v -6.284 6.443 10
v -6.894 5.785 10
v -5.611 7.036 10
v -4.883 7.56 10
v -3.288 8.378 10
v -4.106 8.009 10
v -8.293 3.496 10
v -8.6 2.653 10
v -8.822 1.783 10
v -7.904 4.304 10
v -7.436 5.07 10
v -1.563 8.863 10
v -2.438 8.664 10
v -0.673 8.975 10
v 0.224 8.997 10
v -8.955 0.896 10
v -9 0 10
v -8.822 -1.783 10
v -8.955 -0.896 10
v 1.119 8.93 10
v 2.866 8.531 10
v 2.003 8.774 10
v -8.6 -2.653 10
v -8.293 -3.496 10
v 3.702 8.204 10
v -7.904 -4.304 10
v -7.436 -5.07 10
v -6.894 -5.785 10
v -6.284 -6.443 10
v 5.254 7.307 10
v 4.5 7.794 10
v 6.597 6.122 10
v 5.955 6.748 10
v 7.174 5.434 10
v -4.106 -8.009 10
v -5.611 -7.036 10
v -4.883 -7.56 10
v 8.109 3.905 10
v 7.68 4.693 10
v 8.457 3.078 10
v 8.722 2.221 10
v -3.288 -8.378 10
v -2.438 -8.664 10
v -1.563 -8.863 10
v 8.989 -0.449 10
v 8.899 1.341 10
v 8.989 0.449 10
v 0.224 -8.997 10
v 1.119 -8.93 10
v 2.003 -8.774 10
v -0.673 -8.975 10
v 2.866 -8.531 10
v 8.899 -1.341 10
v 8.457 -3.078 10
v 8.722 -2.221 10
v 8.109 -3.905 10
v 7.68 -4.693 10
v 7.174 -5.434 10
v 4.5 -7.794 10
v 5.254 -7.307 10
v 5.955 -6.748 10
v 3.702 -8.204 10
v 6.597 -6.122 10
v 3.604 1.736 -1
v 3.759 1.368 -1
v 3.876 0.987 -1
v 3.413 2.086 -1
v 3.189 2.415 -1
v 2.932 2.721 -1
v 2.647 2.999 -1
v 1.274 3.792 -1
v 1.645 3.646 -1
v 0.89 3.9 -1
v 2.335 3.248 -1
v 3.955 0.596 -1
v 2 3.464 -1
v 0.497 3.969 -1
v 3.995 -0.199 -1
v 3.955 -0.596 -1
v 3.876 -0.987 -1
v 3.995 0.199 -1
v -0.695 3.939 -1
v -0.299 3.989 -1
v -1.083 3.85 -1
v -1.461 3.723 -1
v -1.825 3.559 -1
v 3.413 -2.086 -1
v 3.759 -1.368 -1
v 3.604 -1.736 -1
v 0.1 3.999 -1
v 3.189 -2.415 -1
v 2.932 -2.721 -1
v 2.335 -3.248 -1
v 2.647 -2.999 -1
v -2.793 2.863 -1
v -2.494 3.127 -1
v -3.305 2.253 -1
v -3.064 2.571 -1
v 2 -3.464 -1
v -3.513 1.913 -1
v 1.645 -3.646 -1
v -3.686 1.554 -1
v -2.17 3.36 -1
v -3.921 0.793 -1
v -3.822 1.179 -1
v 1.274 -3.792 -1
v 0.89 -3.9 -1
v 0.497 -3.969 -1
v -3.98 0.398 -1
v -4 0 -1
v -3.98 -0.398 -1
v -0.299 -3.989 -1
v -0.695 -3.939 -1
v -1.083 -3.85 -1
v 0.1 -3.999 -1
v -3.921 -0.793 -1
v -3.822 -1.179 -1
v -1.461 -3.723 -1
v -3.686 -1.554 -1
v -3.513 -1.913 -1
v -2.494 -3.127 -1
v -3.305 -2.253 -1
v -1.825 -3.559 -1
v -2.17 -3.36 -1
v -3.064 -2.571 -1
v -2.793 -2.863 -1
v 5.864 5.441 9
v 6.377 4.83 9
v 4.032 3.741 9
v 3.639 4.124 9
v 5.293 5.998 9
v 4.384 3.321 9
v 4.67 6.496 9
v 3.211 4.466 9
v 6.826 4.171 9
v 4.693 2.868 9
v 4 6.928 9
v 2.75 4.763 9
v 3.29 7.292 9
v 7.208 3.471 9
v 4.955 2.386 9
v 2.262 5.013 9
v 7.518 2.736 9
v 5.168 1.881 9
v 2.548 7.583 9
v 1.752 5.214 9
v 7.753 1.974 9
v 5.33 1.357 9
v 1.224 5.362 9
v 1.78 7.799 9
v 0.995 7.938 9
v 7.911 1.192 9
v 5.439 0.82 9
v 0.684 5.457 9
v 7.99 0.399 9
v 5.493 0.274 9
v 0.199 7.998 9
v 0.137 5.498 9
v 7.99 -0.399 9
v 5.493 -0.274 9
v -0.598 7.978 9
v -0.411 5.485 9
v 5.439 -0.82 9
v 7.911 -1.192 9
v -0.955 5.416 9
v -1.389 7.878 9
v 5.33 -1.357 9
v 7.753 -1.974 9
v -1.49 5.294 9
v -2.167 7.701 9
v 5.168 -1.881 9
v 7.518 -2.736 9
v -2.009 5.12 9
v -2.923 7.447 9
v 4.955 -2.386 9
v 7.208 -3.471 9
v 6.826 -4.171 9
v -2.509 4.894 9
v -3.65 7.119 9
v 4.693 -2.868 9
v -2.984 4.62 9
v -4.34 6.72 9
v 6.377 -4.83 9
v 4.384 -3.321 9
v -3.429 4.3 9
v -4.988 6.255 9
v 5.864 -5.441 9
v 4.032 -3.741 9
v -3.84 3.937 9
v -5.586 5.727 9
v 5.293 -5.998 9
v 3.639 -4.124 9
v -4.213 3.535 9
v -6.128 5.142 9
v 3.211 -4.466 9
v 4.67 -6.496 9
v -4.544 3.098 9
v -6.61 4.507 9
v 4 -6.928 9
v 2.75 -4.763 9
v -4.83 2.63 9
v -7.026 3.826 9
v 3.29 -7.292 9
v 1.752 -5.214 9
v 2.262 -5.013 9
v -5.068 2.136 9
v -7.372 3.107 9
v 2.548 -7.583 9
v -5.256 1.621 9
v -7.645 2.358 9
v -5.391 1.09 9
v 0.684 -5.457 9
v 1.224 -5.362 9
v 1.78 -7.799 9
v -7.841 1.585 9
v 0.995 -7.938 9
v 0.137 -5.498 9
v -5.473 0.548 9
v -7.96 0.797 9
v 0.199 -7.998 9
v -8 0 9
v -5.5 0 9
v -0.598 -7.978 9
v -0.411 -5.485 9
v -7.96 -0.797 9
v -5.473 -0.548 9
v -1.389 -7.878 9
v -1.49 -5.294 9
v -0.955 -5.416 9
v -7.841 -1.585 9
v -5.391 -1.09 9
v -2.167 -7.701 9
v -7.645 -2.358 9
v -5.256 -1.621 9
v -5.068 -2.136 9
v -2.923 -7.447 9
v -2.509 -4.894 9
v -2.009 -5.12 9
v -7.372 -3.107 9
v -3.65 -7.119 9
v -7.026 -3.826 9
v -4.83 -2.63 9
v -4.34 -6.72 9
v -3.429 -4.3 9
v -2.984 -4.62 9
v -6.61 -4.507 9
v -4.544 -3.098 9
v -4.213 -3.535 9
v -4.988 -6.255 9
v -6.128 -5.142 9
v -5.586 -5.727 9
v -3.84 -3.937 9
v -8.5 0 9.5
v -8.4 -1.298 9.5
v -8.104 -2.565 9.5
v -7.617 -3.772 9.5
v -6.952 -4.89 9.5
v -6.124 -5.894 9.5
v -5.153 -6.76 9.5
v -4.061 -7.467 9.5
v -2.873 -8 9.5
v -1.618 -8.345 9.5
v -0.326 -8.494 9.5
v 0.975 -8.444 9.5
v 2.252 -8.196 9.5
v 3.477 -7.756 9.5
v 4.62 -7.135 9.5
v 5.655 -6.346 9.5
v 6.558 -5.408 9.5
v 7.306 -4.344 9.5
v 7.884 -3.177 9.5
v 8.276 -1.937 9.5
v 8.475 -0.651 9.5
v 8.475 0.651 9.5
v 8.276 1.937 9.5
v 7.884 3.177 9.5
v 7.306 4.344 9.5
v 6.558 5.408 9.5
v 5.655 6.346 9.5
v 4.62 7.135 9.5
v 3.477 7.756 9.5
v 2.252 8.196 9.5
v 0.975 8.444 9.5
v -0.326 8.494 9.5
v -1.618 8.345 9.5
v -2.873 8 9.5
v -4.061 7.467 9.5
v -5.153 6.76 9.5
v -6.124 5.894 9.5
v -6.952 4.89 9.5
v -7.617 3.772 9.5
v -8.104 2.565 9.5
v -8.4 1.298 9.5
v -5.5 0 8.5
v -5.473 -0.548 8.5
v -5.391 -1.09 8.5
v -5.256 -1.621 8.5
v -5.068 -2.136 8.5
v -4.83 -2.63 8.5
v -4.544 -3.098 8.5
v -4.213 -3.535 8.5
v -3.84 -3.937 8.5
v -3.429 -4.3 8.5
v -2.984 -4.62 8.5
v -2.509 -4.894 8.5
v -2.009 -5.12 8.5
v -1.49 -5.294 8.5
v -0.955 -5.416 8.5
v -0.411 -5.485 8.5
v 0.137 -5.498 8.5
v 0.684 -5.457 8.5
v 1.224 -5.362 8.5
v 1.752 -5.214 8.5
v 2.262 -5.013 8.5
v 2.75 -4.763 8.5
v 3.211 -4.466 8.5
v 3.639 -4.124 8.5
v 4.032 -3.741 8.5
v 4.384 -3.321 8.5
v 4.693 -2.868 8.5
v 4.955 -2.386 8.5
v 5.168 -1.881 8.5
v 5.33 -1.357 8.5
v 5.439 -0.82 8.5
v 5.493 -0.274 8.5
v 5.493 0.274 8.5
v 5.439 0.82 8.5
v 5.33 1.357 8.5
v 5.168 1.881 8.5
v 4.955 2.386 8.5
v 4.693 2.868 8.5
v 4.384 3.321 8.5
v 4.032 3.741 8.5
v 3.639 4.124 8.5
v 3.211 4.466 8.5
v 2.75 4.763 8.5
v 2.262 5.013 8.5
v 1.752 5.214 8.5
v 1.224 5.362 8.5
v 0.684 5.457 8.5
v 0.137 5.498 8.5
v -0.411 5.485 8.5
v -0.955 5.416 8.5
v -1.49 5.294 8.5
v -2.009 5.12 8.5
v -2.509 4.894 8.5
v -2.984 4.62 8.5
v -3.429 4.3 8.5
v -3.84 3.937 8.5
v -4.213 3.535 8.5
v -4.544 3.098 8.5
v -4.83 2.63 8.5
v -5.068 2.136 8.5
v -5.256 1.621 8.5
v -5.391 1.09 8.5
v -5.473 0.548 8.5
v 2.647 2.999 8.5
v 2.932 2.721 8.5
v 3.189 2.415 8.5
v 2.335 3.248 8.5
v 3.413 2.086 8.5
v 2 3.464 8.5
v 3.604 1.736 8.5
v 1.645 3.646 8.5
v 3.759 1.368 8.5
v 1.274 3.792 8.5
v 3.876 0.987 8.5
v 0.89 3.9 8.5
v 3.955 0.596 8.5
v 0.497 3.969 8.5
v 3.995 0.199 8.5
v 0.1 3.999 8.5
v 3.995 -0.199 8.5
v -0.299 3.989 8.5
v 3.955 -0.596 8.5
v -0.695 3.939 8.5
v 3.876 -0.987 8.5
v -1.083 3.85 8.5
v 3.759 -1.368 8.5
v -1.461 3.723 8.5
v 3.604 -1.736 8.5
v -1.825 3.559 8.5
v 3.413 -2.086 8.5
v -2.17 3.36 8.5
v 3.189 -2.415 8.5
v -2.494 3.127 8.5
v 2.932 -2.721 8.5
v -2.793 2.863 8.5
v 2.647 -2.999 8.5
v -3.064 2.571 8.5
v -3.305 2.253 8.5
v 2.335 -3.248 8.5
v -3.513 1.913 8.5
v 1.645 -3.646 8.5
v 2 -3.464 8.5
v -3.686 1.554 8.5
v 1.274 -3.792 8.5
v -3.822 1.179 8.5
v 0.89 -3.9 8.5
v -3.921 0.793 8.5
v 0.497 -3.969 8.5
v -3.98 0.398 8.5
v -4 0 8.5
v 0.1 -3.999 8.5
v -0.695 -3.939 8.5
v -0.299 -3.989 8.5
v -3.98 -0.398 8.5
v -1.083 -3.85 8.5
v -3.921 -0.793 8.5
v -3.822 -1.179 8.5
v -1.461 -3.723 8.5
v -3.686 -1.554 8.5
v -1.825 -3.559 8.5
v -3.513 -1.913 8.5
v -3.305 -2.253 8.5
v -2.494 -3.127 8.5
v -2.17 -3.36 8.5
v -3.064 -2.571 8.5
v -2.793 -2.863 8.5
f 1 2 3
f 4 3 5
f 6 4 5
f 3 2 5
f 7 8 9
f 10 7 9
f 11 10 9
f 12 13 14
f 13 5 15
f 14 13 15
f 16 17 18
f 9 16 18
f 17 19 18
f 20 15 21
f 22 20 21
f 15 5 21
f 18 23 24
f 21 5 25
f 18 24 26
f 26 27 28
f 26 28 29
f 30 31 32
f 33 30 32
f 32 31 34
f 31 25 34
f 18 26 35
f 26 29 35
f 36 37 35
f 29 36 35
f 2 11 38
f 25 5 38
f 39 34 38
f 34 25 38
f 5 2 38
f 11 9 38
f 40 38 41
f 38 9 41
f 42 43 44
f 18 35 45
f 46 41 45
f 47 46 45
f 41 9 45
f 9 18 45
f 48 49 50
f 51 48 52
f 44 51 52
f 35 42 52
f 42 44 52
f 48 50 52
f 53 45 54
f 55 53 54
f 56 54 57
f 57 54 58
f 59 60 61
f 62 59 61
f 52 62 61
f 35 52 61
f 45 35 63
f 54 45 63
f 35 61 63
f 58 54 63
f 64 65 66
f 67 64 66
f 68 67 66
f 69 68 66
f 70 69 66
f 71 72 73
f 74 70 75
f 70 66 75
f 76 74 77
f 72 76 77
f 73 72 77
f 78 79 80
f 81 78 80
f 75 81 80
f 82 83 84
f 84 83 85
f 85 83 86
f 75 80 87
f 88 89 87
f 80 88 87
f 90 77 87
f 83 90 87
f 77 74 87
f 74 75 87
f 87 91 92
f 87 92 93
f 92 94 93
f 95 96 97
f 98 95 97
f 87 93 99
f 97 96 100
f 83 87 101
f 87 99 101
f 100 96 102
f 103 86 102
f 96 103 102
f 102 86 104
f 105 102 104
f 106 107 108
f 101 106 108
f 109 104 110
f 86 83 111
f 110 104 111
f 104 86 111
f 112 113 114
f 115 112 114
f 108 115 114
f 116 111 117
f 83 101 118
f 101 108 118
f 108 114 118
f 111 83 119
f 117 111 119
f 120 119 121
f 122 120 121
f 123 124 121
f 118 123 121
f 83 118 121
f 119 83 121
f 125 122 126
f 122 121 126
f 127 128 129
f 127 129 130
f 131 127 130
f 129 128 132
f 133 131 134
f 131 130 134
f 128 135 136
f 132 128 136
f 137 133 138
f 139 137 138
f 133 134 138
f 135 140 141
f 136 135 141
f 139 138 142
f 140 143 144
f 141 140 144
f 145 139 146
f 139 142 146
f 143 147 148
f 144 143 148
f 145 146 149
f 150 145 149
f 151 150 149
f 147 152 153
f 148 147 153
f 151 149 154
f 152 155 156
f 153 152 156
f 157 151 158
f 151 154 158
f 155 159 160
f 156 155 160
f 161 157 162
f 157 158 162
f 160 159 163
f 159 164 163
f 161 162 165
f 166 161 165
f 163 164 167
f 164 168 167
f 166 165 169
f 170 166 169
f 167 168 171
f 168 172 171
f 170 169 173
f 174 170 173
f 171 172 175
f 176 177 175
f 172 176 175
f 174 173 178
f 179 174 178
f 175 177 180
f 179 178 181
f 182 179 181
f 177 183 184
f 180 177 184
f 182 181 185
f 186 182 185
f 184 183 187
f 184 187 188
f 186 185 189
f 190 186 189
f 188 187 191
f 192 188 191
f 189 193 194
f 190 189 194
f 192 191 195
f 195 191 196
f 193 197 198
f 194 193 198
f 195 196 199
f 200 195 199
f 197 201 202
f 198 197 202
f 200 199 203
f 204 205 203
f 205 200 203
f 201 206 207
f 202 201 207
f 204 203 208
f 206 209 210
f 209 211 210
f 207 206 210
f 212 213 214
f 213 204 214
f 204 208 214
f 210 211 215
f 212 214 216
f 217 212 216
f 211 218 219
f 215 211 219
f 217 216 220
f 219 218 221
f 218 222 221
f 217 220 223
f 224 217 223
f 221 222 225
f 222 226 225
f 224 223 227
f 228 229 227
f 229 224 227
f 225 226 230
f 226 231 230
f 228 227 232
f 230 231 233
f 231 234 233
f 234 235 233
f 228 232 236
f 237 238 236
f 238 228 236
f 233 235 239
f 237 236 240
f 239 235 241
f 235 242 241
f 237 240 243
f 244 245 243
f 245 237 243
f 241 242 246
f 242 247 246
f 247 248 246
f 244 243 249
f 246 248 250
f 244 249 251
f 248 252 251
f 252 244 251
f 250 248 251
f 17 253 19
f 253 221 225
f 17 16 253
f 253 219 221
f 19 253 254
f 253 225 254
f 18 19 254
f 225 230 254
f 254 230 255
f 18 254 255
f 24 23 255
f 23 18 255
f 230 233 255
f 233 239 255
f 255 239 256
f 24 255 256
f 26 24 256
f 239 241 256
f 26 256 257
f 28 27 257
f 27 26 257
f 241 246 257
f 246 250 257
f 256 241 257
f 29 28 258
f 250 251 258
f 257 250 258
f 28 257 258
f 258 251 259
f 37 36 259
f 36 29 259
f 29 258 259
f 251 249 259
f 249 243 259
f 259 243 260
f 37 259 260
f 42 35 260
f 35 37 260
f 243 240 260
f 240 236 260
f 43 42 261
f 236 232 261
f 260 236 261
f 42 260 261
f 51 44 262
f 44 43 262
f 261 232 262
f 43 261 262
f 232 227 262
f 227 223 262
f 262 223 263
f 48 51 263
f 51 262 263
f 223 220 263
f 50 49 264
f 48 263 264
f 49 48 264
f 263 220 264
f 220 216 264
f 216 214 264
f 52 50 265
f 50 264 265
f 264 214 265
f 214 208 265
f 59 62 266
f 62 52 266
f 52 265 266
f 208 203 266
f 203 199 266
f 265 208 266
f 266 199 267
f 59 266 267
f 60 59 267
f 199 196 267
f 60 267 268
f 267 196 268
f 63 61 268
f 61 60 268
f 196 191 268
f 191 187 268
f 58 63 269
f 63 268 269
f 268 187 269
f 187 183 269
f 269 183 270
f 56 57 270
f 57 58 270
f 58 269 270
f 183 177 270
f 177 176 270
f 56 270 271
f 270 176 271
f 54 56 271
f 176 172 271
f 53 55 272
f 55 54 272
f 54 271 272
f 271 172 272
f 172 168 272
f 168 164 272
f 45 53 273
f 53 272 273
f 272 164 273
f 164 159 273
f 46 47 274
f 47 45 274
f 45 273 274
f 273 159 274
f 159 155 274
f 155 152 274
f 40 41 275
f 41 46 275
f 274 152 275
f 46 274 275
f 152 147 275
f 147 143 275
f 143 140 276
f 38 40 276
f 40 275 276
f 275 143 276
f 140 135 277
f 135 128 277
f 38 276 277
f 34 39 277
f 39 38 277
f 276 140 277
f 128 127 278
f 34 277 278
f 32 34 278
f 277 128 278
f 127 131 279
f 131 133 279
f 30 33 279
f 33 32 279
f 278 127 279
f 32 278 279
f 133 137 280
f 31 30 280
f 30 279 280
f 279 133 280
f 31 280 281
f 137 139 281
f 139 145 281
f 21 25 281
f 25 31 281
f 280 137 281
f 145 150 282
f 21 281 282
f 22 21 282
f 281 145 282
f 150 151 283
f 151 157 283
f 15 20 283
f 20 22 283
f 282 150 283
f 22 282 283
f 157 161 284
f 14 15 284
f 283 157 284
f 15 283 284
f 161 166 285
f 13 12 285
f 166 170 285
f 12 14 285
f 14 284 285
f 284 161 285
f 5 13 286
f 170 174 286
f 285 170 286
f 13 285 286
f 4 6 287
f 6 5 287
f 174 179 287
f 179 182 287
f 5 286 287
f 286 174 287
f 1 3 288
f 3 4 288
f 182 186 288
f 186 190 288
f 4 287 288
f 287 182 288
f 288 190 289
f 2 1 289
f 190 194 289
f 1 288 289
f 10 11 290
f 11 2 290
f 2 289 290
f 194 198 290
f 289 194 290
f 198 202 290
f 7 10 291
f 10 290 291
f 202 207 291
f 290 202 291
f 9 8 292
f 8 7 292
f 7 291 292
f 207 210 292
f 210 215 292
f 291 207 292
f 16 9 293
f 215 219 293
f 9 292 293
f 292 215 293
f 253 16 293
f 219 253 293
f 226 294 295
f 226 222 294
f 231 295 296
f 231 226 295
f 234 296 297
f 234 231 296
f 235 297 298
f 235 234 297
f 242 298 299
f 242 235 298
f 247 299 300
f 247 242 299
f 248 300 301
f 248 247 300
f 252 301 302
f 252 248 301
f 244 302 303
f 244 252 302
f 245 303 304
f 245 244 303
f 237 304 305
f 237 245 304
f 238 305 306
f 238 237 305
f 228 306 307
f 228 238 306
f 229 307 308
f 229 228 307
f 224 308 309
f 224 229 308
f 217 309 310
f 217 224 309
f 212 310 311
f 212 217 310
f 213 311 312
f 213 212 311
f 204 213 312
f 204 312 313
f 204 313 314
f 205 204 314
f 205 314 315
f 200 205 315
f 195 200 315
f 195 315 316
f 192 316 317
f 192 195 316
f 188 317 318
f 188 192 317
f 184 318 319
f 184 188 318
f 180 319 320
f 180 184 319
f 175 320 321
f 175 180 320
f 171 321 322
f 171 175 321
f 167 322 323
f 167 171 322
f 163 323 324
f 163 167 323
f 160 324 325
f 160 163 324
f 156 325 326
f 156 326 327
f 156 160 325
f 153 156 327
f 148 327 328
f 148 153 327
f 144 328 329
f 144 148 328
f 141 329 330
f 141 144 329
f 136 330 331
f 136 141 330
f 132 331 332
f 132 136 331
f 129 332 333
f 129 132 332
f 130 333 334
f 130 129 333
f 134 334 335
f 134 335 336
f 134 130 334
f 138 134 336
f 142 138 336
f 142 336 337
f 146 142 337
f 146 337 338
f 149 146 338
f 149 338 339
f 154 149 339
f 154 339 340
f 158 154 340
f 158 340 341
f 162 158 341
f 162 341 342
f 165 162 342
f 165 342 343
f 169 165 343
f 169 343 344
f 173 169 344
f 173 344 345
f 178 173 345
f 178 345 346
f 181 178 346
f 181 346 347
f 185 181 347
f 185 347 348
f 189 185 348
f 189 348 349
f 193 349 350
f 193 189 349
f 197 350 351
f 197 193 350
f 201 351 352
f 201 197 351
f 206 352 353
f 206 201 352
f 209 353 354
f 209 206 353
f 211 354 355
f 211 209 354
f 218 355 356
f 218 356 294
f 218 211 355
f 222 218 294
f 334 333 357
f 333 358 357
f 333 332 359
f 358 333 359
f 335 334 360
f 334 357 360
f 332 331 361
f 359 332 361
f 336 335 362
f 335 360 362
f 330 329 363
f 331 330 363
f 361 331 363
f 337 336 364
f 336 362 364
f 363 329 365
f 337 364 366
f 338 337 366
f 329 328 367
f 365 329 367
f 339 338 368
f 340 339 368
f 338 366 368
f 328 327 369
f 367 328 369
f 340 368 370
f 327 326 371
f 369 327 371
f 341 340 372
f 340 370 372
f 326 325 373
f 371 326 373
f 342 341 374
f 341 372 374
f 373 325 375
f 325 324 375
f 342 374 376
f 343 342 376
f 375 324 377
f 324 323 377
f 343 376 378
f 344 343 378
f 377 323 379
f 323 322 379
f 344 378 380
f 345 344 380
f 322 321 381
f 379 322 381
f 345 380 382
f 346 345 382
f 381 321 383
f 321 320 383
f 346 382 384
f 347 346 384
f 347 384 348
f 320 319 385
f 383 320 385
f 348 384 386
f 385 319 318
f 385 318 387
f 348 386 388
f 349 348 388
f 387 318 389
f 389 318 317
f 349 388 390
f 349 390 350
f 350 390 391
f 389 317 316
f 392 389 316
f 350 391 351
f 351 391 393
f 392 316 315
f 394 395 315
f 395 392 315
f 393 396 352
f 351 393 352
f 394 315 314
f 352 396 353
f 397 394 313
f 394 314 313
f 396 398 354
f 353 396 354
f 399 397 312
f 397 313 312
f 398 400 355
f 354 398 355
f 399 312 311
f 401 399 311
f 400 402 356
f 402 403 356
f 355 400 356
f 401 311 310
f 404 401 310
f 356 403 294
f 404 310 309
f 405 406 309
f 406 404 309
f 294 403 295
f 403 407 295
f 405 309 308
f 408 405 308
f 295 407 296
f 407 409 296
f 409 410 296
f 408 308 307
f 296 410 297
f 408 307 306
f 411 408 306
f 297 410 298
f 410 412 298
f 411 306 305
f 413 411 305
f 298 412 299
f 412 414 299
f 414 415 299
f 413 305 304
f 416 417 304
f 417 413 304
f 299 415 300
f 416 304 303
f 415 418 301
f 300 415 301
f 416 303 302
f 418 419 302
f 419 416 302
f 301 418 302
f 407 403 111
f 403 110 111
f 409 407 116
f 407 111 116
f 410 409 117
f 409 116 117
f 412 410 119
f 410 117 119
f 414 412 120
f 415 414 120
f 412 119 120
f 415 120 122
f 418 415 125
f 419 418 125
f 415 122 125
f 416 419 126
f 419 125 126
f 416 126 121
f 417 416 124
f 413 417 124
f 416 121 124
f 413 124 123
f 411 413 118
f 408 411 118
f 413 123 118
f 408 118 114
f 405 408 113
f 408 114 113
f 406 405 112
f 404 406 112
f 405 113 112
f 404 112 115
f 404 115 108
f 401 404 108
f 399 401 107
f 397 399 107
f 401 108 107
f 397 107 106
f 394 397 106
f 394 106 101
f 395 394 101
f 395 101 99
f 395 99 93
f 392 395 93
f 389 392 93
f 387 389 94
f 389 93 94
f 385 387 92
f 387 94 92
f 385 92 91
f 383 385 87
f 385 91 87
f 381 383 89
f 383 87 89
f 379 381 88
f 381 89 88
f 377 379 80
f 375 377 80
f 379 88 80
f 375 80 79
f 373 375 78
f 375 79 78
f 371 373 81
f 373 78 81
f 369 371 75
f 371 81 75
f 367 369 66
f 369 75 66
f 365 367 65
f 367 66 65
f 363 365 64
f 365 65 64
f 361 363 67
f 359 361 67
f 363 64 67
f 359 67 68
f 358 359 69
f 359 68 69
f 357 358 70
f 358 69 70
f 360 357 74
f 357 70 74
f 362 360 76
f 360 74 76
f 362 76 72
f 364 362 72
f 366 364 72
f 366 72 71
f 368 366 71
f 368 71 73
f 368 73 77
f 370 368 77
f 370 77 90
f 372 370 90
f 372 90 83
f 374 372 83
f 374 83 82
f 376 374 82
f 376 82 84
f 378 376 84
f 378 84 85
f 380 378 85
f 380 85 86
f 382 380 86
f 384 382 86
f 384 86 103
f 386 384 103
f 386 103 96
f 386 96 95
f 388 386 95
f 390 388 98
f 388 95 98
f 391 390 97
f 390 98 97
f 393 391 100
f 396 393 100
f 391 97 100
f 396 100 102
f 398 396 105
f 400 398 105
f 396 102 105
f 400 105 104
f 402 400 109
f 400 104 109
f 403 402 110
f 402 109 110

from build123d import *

# Parameters (mm, degrees)
F0_W   = 4
F0_H   = 1
F0_W_2 = 1.5
F0_H_2 = 0.5


# Not quite as in the source:
# - a fillet or chamfer that OpenCascade refuses, or shapes differently, is made with other operations: its cross-section is extruded or revolved along the edge and cut away or added


with BuildPart() as f1:
    # F0 (on Front) → F1 (revolve)
    with BuildSketch(Plane.XZ):
        with Locations((-2, -0.5)):
            Rectangle(F0_W, F0_H)
        Polygon((-4, 0), (0, 0), (0, 10), (-4, 10), (-4, 9), (-4, 8.5), align=None)
        with Locations((-4.75, 8.75)):
            Rectangle(F0_W_2, F0_H_2)
        Polygon((-4, 9), (-4, 10), (-11, 10), (-11, 9), (-5.5, 9), align=None)
    revolve(axis=Axis((0, 0, 5), (0, 0, 1)))

    # F2: chamfer of 3 on 1 edges, made by hand

    # F2_s1 → F2_t2 (revolve, cut)
    with BuildSketch(Plane.XZ):
        Polygon((-11, 12), (-8, 9), (-11, 9), align=None)
    revolve(axis=Axis((0, 0, 9), (0, 0, 1)), mode=Mode.SUBTRACT)


solid = f1.part
